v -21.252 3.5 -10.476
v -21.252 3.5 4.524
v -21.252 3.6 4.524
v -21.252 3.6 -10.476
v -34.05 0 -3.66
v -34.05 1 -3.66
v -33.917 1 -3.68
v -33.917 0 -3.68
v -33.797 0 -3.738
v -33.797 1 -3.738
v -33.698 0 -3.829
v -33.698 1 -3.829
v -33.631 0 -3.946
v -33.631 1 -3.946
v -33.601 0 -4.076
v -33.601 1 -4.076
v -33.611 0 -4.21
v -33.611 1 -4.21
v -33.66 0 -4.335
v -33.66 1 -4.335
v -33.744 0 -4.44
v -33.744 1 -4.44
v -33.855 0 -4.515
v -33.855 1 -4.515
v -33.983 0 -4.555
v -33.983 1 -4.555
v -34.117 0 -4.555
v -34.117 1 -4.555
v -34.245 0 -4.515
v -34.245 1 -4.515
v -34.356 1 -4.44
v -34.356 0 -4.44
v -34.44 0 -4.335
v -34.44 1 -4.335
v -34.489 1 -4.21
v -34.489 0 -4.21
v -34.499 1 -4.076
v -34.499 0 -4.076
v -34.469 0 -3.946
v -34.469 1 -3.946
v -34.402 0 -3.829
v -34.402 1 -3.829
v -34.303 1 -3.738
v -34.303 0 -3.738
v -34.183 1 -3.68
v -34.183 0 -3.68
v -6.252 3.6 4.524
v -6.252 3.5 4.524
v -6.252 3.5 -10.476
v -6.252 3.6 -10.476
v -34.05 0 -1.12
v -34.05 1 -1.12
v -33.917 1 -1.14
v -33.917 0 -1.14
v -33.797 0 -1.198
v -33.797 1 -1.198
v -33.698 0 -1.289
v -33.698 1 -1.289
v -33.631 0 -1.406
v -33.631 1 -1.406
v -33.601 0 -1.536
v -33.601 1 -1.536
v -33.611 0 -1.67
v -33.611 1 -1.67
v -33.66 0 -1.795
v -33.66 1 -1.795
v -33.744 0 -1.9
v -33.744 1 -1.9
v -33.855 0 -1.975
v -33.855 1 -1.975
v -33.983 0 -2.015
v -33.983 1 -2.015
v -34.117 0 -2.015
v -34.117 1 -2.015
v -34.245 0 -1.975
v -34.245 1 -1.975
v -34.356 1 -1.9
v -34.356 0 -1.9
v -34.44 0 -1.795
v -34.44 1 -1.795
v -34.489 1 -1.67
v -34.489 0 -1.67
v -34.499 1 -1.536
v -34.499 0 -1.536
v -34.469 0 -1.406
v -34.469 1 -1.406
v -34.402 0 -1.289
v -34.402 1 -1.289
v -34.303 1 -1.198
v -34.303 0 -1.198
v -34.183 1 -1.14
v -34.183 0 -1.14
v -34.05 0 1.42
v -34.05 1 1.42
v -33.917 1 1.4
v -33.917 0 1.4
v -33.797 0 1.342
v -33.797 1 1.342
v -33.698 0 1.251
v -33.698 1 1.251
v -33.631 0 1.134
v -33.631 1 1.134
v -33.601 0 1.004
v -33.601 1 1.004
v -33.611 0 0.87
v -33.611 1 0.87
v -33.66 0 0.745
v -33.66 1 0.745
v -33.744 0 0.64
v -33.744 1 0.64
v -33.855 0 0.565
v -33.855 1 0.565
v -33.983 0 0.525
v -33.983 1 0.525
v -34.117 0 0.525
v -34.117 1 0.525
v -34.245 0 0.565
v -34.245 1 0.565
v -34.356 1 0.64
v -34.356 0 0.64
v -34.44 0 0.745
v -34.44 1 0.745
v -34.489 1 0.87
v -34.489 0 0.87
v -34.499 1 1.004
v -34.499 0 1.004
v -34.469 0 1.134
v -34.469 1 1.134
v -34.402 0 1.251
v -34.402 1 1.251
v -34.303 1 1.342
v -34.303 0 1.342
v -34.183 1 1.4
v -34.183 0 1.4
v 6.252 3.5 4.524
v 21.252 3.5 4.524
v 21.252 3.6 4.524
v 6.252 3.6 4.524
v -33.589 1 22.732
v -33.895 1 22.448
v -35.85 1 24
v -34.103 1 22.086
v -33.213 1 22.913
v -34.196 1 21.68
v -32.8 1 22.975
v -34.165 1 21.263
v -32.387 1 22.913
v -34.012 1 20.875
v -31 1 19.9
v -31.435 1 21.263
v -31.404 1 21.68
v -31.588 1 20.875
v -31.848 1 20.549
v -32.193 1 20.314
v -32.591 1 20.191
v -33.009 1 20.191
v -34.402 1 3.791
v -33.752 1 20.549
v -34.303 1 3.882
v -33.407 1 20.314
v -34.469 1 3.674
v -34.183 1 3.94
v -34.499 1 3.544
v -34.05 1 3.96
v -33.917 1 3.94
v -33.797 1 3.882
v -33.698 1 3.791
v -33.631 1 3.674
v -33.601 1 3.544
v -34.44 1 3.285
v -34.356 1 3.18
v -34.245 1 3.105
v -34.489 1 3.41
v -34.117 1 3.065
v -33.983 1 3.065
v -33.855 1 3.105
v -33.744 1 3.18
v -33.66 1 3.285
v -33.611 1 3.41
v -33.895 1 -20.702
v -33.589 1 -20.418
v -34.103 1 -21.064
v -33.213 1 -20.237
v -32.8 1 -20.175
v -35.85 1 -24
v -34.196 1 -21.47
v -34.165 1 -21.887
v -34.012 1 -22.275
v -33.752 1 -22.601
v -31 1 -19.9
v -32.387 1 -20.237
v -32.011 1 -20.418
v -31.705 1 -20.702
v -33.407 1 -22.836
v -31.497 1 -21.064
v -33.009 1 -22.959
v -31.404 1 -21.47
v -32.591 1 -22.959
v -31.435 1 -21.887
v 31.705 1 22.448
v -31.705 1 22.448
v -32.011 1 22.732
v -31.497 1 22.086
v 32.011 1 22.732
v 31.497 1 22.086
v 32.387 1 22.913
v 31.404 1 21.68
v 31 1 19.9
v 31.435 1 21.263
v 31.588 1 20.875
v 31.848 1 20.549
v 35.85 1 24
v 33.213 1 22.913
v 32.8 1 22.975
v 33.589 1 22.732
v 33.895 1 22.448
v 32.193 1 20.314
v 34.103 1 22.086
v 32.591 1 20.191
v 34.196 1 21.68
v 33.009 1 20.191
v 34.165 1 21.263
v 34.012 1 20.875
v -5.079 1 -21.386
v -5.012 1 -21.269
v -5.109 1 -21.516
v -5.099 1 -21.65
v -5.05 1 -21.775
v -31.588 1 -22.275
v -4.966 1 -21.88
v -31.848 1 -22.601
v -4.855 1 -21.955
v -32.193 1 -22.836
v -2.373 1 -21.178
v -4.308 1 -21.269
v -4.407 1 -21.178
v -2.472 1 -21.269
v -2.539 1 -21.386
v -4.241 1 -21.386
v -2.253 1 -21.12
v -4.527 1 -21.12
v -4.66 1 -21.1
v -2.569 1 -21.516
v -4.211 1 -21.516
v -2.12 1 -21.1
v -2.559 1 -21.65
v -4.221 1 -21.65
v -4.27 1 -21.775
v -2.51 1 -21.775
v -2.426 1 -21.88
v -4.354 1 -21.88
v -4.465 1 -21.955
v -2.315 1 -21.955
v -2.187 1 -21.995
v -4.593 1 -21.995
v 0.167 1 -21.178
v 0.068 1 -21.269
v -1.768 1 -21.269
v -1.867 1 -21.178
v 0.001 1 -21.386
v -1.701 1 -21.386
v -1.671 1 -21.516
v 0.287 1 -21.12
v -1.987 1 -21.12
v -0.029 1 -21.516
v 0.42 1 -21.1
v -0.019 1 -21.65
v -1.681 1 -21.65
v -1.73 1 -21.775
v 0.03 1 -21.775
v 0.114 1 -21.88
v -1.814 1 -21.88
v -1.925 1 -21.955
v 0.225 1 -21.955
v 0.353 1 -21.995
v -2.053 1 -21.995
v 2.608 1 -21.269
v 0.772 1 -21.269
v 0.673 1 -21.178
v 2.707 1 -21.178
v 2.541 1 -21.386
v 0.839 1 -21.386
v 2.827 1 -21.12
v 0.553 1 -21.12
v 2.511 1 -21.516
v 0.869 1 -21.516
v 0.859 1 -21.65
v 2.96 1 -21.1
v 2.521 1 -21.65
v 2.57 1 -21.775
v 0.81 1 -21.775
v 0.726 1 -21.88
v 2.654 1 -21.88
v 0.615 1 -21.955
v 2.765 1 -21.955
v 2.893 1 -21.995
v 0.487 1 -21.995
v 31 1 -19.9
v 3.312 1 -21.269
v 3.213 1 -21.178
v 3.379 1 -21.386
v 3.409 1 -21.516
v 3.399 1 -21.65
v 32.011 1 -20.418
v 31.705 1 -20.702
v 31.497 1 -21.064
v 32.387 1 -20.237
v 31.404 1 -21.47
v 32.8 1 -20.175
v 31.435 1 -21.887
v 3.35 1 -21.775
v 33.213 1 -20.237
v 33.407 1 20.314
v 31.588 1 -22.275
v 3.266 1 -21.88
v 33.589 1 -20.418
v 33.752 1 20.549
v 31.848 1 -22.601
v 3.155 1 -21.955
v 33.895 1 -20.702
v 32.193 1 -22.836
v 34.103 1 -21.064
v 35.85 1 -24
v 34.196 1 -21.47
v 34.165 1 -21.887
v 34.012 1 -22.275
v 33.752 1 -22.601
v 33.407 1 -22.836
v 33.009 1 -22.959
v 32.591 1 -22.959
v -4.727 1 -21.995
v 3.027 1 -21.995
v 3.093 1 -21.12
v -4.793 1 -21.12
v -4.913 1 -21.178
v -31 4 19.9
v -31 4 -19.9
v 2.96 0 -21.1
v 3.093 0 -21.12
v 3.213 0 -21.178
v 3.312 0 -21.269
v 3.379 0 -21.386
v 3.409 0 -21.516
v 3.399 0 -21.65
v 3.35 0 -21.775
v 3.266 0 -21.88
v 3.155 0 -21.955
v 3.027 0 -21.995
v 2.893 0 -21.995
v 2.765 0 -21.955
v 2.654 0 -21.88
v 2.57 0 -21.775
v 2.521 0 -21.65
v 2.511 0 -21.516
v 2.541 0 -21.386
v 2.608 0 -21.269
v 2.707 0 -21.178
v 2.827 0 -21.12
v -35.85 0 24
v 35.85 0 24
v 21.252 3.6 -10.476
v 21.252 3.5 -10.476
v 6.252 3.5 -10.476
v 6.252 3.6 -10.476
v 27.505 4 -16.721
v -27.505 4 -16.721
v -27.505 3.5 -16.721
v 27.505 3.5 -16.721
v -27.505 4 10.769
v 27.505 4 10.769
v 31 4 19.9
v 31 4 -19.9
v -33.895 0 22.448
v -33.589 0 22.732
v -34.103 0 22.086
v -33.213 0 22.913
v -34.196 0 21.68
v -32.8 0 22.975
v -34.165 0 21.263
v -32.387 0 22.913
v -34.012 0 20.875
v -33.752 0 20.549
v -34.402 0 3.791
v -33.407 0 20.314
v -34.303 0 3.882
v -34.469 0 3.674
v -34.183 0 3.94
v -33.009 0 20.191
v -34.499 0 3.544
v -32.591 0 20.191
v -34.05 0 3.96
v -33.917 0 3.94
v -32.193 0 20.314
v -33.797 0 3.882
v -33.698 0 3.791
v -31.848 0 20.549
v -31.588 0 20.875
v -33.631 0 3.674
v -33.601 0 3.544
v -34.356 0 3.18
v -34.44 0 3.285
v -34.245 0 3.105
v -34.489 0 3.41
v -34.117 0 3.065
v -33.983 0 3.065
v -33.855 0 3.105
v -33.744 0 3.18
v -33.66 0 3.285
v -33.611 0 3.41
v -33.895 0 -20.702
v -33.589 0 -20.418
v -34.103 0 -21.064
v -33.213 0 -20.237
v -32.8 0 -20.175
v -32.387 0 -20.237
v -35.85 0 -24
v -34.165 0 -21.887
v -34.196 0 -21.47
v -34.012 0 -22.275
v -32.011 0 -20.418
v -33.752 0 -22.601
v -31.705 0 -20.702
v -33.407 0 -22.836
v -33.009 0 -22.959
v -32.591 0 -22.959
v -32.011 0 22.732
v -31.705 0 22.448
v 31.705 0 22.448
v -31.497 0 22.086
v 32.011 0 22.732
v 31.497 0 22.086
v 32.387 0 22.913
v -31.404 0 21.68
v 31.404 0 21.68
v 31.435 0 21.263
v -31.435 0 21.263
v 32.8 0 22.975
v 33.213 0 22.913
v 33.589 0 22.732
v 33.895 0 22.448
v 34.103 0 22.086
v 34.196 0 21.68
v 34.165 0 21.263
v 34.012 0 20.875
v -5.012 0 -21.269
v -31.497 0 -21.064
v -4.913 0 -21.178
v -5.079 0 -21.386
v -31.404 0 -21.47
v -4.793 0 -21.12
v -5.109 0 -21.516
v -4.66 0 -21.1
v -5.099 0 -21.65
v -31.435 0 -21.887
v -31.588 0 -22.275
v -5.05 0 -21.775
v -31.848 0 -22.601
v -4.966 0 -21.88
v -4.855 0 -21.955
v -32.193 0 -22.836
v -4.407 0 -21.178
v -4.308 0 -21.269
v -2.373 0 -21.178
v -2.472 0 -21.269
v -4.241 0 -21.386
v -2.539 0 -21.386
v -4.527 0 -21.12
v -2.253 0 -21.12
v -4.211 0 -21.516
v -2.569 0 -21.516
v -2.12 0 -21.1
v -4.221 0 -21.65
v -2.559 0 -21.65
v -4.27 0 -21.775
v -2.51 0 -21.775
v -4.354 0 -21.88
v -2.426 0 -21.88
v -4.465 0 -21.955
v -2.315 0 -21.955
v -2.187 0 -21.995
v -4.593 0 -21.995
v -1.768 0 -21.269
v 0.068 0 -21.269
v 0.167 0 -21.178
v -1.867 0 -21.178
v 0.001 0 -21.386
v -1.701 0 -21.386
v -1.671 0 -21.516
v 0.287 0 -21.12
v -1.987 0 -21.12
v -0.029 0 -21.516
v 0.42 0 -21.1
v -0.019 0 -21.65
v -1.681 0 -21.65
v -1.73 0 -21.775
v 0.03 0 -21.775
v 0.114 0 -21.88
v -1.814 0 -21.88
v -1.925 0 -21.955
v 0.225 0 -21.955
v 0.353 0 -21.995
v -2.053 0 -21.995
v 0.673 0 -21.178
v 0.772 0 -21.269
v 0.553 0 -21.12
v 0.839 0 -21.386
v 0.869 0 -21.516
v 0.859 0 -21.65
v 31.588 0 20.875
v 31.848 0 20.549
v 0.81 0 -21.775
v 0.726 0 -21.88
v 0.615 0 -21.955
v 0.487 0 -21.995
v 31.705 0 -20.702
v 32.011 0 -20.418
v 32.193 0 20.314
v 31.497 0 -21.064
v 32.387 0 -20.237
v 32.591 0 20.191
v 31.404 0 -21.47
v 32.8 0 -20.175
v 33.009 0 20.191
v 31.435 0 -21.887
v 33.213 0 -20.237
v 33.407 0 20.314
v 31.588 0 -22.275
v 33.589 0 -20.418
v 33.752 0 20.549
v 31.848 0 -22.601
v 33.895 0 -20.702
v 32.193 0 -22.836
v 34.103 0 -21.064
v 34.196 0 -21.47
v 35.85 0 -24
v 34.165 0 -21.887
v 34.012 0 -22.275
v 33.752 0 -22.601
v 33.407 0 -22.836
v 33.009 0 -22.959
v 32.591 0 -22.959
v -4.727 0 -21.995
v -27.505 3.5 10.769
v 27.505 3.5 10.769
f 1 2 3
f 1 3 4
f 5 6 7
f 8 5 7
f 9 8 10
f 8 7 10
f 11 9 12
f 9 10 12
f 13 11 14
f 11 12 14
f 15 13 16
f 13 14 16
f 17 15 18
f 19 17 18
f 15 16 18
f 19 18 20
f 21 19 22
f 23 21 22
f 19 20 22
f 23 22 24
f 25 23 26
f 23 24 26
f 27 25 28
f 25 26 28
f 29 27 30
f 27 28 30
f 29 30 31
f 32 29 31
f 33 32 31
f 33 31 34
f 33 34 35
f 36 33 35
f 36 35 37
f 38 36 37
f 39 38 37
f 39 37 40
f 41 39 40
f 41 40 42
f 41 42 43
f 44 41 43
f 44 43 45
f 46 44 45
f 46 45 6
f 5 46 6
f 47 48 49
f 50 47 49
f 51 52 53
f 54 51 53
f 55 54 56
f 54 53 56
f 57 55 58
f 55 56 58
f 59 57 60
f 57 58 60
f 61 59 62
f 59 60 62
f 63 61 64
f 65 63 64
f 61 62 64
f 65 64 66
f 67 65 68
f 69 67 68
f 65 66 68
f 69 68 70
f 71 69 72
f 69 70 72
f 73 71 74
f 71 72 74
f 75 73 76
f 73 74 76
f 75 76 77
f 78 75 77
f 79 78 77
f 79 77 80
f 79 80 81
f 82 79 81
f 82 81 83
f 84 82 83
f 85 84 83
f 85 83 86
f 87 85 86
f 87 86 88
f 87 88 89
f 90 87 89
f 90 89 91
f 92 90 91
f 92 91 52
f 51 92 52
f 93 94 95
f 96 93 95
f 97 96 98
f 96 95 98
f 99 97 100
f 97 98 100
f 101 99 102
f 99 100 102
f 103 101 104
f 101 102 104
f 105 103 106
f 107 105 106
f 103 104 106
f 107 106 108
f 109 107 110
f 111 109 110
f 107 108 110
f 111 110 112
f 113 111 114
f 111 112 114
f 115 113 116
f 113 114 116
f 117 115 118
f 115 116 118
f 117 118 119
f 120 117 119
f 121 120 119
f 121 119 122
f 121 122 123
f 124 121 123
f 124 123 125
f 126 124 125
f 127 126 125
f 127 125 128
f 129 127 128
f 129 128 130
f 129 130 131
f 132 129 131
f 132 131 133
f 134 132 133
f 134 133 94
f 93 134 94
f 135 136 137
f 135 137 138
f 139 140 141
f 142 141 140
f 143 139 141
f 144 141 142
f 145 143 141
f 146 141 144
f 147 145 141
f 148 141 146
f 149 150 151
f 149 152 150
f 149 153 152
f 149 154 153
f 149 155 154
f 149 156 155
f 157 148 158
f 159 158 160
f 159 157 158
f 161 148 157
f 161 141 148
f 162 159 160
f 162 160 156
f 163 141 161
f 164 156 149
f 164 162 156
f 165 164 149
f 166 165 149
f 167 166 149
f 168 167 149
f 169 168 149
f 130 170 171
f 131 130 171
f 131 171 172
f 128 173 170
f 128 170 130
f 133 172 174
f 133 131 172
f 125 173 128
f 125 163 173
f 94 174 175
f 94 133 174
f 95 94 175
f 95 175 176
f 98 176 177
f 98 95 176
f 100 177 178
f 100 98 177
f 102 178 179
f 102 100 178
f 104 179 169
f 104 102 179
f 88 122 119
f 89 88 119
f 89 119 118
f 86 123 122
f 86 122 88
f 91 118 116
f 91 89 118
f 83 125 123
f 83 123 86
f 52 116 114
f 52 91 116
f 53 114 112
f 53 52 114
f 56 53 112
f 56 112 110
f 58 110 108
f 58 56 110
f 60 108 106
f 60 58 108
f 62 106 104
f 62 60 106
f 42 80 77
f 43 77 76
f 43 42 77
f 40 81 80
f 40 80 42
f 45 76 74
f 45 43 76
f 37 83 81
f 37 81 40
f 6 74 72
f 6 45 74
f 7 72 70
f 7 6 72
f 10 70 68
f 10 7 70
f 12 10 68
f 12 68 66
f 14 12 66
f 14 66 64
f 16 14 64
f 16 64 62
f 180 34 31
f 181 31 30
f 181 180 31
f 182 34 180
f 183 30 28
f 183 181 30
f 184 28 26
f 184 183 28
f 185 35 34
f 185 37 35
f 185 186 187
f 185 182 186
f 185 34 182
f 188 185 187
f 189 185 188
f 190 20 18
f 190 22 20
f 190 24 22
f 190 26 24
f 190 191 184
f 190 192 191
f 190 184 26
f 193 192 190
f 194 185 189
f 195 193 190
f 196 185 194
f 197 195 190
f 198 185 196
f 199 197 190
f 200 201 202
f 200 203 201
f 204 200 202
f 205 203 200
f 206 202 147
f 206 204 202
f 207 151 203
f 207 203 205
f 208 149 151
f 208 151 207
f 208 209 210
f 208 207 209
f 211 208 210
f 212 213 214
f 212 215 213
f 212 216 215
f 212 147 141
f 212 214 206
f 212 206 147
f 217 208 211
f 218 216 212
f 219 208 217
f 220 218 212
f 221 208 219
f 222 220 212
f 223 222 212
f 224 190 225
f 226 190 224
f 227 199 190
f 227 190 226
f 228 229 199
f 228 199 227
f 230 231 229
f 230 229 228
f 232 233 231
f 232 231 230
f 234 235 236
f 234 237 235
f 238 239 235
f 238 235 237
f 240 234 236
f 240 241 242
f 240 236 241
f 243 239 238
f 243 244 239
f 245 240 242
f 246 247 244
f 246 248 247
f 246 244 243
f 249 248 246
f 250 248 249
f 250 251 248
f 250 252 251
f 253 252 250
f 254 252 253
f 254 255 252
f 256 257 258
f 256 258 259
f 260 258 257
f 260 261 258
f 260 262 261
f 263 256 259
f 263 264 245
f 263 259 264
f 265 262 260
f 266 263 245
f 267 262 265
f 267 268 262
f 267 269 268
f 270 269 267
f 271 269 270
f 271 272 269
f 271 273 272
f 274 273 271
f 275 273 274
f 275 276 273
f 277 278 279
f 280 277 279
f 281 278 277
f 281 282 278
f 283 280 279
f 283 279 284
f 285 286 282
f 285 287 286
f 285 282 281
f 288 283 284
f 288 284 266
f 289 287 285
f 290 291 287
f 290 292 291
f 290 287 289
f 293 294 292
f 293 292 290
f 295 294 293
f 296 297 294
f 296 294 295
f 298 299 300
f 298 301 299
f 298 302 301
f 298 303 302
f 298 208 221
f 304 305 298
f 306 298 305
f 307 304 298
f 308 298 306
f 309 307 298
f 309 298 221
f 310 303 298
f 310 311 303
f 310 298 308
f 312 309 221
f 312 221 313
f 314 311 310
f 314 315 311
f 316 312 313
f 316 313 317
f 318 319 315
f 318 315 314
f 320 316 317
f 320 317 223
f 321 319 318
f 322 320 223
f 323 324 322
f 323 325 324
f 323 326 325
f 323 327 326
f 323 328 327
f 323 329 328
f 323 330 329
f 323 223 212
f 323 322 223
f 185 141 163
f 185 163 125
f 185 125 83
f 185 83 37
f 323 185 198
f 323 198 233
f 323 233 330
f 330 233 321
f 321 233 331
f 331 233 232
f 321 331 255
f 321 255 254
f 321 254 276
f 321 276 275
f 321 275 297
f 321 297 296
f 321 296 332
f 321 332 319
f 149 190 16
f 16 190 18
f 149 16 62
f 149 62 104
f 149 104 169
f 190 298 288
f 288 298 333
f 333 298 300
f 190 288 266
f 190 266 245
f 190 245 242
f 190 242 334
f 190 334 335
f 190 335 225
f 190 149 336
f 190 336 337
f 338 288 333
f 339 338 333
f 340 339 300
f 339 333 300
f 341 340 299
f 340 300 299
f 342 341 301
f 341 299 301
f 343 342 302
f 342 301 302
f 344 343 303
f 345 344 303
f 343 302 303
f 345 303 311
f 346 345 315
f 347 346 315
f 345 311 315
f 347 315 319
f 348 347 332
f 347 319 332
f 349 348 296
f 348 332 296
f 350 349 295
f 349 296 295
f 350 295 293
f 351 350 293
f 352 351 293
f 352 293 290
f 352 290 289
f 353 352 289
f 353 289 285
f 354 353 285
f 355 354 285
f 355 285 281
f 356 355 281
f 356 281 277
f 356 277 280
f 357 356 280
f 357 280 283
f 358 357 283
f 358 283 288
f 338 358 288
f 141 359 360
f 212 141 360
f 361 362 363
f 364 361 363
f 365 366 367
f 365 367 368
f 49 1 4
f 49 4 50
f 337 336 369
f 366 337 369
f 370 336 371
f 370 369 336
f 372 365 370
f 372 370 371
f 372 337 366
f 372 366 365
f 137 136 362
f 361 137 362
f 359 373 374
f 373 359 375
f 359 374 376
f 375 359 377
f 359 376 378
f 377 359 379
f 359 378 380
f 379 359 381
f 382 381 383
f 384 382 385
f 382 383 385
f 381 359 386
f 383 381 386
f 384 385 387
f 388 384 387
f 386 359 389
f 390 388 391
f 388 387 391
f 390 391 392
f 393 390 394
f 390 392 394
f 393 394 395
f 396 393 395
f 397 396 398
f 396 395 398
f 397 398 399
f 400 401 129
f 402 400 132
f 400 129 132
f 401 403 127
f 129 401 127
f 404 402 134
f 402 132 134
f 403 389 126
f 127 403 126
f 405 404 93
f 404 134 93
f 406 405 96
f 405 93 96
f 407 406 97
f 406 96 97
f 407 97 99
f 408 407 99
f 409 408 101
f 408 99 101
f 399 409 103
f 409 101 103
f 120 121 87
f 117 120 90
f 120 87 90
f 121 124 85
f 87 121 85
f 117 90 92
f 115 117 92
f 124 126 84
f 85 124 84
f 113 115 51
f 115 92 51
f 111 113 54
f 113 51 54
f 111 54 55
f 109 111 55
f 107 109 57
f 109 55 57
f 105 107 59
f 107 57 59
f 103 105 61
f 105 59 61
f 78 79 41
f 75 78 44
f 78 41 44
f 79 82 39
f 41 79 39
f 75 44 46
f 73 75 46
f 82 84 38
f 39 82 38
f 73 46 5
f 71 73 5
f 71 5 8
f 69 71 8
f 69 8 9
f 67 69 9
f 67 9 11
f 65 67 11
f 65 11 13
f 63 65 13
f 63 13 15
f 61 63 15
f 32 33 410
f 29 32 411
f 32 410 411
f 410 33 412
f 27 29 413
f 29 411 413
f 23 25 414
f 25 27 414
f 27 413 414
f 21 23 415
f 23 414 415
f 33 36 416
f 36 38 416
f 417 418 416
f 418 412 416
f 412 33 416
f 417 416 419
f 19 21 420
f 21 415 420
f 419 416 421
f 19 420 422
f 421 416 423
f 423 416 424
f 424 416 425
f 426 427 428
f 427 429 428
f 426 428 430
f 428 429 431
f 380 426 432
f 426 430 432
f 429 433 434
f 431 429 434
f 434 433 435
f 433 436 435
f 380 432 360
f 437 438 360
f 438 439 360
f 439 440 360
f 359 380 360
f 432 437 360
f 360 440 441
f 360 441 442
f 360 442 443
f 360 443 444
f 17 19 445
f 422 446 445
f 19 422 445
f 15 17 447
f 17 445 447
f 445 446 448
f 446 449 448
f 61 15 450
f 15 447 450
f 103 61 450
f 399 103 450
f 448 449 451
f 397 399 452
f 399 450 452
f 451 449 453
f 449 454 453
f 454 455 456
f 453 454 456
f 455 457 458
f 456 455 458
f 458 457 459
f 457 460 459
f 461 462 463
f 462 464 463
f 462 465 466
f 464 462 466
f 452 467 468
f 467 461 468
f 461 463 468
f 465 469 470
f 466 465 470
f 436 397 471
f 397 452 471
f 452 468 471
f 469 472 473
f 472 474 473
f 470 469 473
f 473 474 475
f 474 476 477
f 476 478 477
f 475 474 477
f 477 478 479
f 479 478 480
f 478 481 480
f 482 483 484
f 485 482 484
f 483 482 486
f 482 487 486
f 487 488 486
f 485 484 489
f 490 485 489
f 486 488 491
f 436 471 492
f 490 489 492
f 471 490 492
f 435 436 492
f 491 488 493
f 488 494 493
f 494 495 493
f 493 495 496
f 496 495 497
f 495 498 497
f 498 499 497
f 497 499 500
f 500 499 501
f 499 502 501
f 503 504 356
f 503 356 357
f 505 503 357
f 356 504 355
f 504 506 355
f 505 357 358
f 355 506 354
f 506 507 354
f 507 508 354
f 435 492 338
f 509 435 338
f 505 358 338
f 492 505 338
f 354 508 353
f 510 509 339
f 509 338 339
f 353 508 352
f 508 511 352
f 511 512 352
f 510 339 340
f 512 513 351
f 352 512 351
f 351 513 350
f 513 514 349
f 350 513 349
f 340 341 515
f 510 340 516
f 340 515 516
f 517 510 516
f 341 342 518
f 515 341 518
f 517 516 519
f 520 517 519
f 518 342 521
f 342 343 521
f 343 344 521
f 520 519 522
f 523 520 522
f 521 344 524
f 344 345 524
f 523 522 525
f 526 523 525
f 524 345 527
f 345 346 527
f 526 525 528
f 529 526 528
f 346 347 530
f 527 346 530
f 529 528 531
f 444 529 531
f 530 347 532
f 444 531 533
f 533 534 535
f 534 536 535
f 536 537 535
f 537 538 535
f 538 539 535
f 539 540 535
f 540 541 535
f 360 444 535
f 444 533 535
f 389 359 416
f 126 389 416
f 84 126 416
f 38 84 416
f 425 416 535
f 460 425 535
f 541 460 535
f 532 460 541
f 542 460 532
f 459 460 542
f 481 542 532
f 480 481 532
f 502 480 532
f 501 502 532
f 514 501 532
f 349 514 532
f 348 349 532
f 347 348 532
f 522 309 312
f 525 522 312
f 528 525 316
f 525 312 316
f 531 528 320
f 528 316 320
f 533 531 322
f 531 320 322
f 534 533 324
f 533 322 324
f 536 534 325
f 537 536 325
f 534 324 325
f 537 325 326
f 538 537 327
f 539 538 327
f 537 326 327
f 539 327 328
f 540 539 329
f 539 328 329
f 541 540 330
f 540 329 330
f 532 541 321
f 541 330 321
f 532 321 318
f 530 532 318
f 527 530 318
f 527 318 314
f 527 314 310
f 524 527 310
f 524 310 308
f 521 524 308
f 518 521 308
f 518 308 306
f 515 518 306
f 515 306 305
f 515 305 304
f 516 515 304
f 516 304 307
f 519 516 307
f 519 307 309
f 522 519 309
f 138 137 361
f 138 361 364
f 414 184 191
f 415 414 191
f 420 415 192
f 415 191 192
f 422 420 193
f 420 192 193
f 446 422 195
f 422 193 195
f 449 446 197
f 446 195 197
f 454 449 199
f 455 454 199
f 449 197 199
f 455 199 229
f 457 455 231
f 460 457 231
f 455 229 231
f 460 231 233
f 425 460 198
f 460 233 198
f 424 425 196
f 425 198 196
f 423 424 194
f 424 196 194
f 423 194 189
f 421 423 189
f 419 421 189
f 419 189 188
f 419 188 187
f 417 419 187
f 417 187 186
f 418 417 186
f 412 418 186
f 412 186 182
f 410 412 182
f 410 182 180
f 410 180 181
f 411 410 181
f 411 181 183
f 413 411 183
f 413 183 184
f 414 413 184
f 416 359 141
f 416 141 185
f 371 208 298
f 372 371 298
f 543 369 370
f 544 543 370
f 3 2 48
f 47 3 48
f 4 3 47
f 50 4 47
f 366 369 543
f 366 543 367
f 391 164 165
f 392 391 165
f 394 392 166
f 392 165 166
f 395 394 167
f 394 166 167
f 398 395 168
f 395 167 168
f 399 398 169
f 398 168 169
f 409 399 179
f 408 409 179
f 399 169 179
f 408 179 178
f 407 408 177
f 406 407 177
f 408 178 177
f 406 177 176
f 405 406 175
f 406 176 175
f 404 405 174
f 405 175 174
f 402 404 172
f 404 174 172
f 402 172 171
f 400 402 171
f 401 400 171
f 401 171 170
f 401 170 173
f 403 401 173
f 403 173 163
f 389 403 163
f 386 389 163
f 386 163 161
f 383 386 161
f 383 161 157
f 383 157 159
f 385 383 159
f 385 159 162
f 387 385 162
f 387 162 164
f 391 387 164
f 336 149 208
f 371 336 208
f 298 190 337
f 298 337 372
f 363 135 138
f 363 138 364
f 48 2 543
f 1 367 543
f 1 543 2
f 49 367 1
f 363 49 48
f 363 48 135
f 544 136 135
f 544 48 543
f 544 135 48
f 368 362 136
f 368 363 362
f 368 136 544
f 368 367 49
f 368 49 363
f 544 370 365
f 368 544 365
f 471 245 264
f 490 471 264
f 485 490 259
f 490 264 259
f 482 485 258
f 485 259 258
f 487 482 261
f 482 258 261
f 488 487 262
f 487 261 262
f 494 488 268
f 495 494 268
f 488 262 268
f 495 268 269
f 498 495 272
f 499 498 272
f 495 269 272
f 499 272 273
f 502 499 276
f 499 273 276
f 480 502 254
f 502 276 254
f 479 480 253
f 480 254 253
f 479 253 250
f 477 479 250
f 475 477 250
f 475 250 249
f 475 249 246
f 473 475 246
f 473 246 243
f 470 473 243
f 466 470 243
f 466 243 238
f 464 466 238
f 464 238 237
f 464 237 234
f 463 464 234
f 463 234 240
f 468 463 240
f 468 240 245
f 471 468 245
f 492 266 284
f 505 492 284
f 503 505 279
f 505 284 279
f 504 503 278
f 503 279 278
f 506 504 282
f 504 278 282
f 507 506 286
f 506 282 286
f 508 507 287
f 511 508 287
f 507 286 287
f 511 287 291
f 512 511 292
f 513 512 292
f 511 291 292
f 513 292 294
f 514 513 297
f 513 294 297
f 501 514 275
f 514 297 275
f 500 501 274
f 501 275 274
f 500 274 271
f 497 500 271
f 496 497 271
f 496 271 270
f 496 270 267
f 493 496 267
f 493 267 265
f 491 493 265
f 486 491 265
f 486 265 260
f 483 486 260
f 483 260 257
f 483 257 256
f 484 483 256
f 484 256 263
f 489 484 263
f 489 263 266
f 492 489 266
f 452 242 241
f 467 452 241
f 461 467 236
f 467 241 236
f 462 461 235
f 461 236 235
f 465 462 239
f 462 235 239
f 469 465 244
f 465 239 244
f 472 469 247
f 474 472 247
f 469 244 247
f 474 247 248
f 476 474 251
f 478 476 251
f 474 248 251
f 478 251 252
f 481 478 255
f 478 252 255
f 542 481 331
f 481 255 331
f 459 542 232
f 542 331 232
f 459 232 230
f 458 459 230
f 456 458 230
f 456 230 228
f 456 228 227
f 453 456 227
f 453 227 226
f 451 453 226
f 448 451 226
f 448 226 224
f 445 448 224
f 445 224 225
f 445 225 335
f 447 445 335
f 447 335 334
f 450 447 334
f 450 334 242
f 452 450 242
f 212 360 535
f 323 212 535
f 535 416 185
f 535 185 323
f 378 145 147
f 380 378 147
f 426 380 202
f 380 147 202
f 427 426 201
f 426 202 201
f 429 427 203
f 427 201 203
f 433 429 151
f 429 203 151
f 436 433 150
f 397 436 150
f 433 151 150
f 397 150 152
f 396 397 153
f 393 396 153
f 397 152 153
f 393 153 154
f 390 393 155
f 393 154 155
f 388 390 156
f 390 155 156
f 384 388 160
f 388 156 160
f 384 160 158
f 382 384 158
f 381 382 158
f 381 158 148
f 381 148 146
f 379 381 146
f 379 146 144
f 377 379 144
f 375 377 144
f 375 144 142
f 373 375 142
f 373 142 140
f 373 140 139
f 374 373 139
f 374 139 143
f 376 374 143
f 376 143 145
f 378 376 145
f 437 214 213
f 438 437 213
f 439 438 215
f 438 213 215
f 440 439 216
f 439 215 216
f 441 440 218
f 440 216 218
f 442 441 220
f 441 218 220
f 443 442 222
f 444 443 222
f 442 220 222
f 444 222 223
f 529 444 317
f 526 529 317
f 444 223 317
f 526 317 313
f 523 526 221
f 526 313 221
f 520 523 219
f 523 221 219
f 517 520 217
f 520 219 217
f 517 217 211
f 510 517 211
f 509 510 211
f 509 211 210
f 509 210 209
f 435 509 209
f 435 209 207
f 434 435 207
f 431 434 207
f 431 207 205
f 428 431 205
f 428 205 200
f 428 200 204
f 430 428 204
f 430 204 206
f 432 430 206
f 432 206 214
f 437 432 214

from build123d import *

# Parameters (mm, degrees)
SKETCH1_W           = 71.7
SKETCH1_H           = 48
BOSS_EXTRUDE1_DEPTH = 1
SKETCH2_R           = 1.4
CUT_EXTRUDE1_DEPTH  = 44.153476106
BOSS_EXTRUDE2_START = -1
SKETCH3_W           = 62
SKETCH3_H           = 39.8
BOSS_EXTRUDE2_DEPTH = 4
SKETCH4_W           = 55.01
SKETCH4_H           = 27.49
CUT_EXTRUDE2_DEPTH  = 0.5
SKETCH5_R           = 0.45
CUT_EXTRUDE3_DEPTH  = 44.246069186
LPATTERN1_COUNT     = 4
LPATTERN1_PITCH     = 2.54
SKETCH6_R           = 0.45
CUT_EXTRUDE4_DEPTH  = 44.246069186
LPATTERN2_COUNT     = 4
LPATTERN2_PITCH     = 2.54
SKETCH7_W           = 15
SKETCH7_H           = 15
BOSS_EXTRUDE3_DEPTH = 0.1


with BuildPart() as part:
    # Sketch1 → Boss-Extrude1 (new body)
    with BuildSketch(Plane(origin=(0, 0, 0), x_dir=(1, 0, 0), z_dir=(0, 1, 0))):
        Rectangle(SKETCH1_W, SKETCH1_H)
    extrude(amount=BOSS_EXTRUDE1_DEPTH)

    # Sketch2 → Cut-Extrude1 (cut, through all)
    with BuildSketch(Plane(origin=(0, 1, 0), x_dir=(1, 0, 0), z_dir=(0, 1, 0))):
        with Locations(Location((-32.8, 21.575, 0), (0, 0, 270))):
            Circle(SKETCH2_R)
        with Locations(Location((32.8, 21.575, 0), (0, 0, 270))):
            Circle(SKETCH2_R)
        with Locations(Location((-32.8, -21.575, 0), (0, 0, 270))):
            Circle(SKETCH2_R)
        with Locations(Location((32.8, -21.575, 0), (0, 0, 270))):
            Circle(SKETCH2_R)
    extrude(amount=-CUT_EXTRUDE1_DEPTH, mode=Mode.SUBTRACT)

    # Sketch3 → Boss-Extrude2 (add)
    with BuildSketch(Plane(origin=(0, 1, 0), x_dir=(1, 0, 0), z_dir=(0, 1, 0)).offset(BOSS_EXTRUDE2_START)):
        Rectangle(SKETCH3_W, SKETCH3_H)
    extrude(amount=BOSS_EXTRUDE2_DEPTH)

    # Sketch4 → Cut-Extrude2 (cut)
    with BuildSketch(Plane(origin=(0, 4, 0), x_dir=(1, 0, 0), z_dir=(0, 1, 0))):
        with Locations((0, 2.976)):
            Rectangle(SKETCH4_W, SKETCH4_H)
    extrude(amount=-CUT_EXTRUDE2_DEPTH, mode=Mode.SUBTRACT)

    # Sketch5 → Cut-Extrude3 (cut, through all)
    with BuildSketch(Plane(origin=(0, 1, 0), x_dir=(1, 0, 0), z_dir=(0, 1, 0))):
        with Locations(Location((-4.66, 21.55, 0), (0, 0, 270))):
            Circle(SKETCH5_R)
    cut_extrude3 = extrude(amount=-CUT_EXTRUDE3_DEPTH, mode=Mode.SUBTRACT)

    # LPattern1: Cut-Extrude3 ×4
    with Locations(*[(i * LPATTERN1_PITCH, 0, 0) for i in range(1, LPATTERN1_COUNT)]):
        add(cut_extrude3, mode=Mode.SUBTRACT)

    # Sketch6 → Cut-Extrude4 (cut, through all)
    with BuildSketch(Plane(origin=(0, 1, 0), x_dir=(1, 0, 0), z_dir=(0, 1, 0))):
        with Locations(Location((-34.05, 4.11, 0), (0, 0, 270))):
            Circle(SKETCH6_R)
    cut_extrude4 = extrude(amount=-CUT_EXTRUDE4_DEPTH, mode=Mode.SUBTRACT)

    # LPattern2: Cut-Extrude4 ×4
    with Locations(*[(0, 0, i * LPATTERN2_PITCH) for i in range(1, LPATTERN2_COUNT)]):
        add(cut_extrude4, mode=Mode.SUBTRACT)

    # Sketch7 → Boss-Extrude3 (add)
    with BuildSketch(Plane(origin=(0, 3.5, 0), x_dir=(1, 0, 0), z_dir=(0, 1, 0))):
        with Locations((-13.7525, 2.976)):
            Rectangle(SKETCH7_W, SKETCH7_H)
    boss_extrude3 = extrude(amount=BOSS_EXTRUDE3_DEPTH)

    # Mirror1: Boss-Extrude3 across plane
    add(boss_extrude3.mirror(Plane(origin=(0, 0, 0), x_dir=(0, 0, 1), z_dir=(1, 0, 0))))


solid = part.part
